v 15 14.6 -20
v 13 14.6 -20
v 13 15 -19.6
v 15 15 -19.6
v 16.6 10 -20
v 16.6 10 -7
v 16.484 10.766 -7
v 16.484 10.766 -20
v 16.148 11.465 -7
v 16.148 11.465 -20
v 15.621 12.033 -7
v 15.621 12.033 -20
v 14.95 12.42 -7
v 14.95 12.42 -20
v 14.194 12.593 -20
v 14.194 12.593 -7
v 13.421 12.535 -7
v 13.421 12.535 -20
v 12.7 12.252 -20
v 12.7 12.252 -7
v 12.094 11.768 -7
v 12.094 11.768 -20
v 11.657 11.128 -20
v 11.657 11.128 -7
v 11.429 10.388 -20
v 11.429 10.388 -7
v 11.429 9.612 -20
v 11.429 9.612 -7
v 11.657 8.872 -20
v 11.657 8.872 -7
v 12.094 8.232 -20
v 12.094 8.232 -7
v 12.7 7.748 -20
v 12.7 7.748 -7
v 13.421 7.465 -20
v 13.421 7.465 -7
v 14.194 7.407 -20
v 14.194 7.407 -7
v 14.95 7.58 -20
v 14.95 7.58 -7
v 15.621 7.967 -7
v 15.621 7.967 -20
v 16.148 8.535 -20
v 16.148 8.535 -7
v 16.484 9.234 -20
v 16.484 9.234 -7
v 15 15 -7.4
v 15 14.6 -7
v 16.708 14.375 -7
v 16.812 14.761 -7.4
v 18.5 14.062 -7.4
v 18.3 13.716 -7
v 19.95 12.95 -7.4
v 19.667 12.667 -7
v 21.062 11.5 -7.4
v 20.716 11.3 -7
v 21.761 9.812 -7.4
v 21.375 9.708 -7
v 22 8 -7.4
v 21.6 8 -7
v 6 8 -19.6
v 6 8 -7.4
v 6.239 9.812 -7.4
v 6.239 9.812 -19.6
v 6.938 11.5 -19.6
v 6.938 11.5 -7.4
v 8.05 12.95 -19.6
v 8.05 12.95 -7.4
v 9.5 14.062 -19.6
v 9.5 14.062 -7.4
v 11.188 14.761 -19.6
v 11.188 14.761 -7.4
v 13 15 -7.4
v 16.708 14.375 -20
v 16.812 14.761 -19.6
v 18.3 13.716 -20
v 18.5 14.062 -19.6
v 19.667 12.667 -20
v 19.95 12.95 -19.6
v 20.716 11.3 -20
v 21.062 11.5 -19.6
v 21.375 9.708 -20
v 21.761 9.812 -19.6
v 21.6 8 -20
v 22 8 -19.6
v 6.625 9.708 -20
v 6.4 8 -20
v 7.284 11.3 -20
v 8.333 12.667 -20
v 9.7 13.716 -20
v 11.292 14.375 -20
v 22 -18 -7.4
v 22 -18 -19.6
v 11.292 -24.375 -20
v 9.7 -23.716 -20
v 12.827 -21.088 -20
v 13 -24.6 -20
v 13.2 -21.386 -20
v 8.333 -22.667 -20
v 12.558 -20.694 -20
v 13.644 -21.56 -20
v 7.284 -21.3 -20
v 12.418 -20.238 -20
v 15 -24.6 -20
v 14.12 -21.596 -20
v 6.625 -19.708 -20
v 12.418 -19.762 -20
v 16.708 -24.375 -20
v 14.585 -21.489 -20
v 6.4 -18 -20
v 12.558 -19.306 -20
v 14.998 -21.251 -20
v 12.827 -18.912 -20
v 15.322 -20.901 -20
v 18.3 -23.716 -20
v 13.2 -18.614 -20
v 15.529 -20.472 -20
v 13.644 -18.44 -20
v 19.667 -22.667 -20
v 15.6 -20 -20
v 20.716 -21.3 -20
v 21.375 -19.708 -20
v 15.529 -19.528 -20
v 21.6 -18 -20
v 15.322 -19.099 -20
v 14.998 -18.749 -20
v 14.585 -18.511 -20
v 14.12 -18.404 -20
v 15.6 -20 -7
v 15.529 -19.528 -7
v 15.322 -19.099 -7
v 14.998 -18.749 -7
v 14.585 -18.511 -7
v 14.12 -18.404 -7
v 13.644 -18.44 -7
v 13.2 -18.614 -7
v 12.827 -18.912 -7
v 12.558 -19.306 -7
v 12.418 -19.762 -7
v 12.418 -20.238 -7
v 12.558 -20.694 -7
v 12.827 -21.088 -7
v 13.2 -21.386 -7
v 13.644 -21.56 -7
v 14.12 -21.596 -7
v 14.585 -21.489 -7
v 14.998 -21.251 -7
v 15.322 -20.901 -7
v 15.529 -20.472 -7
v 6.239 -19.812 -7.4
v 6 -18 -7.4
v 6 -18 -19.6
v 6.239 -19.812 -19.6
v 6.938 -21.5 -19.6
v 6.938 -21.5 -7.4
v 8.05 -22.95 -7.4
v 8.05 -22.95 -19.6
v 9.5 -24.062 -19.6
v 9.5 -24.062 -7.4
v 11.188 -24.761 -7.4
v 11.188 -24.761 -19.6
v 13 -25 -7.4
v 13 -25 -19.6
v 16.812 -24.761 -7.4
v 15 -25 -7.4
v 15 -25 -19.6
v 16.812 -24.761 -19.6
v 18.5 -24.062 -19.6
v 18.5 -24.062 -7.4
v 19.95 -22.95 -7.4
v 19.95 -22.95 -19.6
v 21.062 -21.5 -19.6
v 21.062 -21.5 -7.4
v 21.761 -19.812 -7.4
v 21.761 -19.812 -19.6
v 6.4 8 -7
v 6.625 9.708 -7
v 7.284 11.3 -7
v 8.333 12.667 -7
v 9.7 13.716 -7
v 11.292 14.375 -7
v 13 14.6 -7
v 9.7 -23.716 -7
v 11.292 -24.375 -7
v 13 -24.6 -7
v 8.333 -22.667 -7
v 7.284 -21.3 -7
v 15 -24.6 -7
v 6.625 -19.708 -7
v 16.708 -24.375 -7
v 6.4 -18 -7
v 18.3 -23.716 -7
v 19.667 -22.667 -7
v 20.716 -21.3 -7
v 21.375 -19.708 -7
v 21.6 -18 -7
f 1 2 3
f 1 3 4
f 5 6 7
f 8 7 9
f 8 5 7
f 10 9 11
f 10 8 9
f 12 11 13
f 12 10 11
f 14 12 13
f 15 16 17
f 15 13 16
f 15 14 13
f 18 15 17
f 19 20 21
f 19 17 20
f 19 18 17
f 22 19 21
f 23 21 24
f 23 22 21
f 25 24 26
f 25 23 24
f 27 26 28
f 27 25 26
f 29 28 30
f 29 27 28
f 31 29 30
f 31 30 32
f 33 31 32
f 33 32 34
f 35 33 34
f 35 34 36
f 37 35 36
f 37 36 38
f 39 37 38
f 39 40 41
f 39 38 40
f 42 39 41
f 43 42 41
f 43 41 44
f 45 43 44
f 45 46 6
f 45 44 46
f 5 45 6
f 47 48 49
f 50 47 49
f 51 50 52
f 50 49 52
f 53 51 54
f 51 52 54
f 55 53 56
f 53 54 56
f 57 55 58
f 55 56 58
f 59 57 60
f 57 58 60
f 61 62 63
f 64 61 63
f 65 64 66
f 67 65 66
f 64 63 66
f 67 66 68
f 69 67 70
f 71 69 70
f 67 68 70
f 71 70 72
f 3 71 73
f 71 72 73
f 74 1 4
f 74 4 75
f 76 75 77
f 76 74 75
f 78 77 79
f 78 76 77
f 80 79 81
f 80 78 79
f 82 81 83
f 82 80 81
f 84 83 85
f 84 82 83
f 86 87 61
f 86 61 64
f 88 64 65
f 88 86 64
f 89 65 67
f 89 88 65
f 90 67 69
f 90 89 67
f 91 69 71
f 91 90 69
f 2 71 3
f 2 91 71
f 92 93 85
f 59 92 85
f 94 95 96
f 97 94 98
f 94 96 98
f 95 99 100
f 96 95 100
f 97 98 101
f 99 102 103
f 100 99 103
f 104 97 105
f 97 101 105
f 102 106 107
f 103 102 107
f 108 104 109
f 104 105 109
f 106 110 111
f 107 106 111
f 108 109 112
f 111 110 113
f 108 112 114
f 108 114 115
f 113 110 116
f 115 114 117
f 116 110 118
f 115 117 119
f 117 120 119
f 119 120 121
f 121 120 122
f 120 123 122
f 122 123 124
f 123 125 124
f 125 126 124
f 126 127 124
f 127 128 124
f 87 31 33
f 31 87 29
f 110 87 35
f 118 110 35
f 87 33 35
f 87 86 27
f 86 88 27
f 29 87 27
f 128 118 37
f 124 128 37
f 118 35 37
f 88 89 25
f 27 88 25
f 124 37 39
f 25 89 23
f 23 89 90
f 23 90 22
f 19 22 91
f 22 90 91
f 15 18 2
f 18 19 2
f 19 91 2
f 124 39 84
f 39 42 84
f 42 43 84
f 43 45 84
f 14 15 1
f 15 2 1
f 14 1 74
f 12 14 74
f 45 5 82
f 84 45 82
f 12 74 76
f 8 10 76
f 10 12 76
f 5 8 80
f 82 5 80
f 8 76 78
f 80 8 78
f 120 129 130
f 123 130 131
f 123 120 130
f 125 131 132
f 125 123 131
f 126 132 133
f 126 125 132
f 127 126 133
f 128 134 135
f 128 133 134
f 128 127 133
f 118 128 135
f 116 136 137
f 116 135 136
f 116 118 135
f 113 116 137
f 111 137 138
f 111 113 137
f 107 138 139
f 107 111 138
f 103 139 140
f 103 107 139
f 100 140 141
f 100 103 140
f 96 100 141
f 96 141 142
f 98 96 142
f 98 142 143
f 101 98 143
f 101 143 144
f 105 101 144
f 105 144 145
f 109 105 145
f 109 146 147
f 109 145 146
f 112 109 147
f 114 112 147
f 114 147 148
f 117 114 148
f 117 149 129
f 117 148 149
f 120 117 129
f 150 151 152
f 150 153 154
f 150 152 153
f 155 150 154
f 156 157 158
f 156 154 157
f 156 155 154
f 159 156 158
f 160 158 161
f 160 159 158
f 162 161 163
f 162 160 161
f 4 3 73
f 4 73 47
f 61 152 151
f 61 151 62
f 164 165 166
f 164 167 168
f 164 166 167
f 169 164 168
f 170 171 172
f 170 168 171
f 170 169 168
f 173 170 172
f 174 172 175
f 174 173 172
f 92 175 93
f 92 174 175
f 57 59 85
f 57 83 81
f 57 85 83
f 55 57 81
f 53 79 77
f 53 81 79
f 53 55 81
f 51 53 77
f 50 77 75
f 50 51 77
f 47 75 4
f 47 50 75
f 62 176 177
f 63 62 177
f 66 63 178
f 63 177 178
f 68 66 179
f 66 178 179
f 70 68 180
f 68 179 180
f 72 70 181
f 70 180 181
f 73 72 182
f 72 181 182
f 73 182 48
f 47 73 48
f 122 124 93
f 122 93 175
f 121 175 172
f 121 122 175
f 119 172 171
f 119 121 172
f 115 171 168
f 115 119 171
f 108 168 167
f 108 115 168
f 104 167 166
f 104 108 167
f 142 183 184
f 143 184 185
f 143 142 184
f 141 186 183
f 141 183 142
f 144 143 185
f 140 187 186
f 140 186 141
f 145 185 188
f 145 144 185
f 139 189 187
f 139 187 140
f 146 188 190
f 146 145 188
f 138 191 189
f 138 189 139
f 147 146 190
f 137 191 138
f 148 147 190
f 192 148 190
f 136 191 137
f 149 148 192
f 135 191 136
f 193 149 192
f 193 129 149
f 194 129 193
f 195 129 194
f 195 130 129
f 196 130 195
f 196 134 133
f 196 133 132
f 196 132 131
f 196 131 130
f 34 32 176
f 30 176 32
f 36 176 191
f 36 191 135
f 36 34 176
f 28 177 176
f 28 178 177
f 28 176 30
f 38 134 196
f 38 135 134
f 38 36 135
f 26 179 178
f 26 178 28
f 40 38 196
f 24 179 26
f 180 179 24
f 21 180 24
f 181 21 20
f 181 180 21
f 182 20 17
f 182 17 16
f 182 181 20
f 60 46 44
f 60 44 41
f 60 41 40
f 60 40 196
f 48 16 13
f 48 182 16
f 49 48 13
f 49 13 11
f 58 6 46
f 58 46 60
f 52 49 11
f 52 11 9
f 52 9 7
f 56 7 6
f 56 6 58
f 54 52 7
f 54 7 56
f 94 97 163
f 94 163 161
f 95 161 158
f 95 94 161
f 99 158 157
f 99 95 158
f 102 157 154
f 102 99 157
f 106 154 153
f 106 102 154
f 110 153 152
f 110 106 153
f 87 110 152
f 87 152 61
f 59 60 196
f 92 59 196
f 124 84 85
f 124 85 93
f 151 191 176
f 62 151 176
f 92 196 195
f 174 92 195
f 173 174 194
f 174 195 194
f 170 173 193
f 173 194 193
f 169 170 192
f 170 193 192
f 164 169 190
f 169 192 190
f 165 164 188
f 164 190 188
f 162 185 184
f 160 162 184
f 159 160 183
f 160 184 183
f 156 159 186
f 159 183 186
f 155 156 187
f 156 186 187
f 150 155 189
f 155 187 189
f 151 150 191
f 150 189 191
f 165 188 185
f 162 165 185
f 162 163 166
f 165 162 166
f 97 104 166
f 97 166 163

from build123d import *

# Parameters (mm, degrees)
CYLINDER007_R     = 2.6
CYLINDER007_DEPTH = 15
CYLINDER008_R     = 1.6
CYLINDER008_DEPTH = 15
BOX007_W          = 16
BOX007_H          = 40
BOX007_DEPTH      = 13
FILLET_R          = 7
CHAMFER008_SIZE   = 0.4


with BuildPart() as cylinder007:
    # Cylinder007 → Cylinder007 (new body)
    with BuildSketch(Plane(origin=(10, 10, -20), x_dir=(1, 0, 0), z_dir=(0, 0, 1))):
        Circle(CYLINDER007_R)
    extrude(amount=CYLINDER007_DEPTH)


with BuildPart() as fusion009:
    # Cylinder008 → Cylinder008 (new body)
    with BuildSketch(Plane(origin=(10, -20, -20), x_dir=(1, 0, 0), z_dir=(0, 0, 1))):
        Circle(CYLINDER008_R)
    extrude(amount=CYLINDER008_DEPTH)

    # Fusion009: union Cylinder007
    add(cylinder007.part)


with BuildPart() as hingle_base:
    # Box007 → Box007 (new body)
    with BuildSketch(Plane(origin=(2, -25, -20), x_dir=(1, 0, 0), z_dir=(0, 0, 1))):
        with Locations((8, 20)):
            Rectangle(BOX007_W, BOX007_H)
    extrude(amount=BOX007_DEPTH)

    # Fillet
    fillet_edges = [hingle_base.edges().sort_by_distance(p)[0] for p in [
        (2, -25, -13.5),
        (2, 15, -13.5),
        (18, -25, -13.5),
        (18, 15, -13.5),
    ]]
    fillet(fillet_edges, radius=FILLET_R)

    # Chamfer008
    chamfer008_edges = [hingle_base.edges().sort_by_distance(p)[0] for p in [
        (2, -5, -7),
        (2, -5, -20),
        (4.050253, -22.949747, -7),
        (4.050253, 12.949747, -7),
        (10, -25, -7),
        (10, 15, -7),
        (15.949747, -22.949747, -7),
        (15.949747, 12.949747, -7),
        (18, -5, -7),
        (4.050253, -22.949747, -20),
        (4.050253, 12.949747, -20),
        (10, -25, -20),
        (10, 15, -20),
        (15.949747, -22.949747, -20),
        (15.949747, 12.949747, -20),
        (18, -5, -20),
    ]]
    chamfer(chamfer008_edges, length=CHAMFER008_SIZE)

    # Cut008: cut Fusion009
    add(fusion009.part, mode=Mode.SUBTRACT)


with BuildPart() as hingle_base_1:
    # Cut008 placement: moved
    add(hingle_base.part.moved(Location((4, 0, 0))))


solid = hingle_base_1.part
